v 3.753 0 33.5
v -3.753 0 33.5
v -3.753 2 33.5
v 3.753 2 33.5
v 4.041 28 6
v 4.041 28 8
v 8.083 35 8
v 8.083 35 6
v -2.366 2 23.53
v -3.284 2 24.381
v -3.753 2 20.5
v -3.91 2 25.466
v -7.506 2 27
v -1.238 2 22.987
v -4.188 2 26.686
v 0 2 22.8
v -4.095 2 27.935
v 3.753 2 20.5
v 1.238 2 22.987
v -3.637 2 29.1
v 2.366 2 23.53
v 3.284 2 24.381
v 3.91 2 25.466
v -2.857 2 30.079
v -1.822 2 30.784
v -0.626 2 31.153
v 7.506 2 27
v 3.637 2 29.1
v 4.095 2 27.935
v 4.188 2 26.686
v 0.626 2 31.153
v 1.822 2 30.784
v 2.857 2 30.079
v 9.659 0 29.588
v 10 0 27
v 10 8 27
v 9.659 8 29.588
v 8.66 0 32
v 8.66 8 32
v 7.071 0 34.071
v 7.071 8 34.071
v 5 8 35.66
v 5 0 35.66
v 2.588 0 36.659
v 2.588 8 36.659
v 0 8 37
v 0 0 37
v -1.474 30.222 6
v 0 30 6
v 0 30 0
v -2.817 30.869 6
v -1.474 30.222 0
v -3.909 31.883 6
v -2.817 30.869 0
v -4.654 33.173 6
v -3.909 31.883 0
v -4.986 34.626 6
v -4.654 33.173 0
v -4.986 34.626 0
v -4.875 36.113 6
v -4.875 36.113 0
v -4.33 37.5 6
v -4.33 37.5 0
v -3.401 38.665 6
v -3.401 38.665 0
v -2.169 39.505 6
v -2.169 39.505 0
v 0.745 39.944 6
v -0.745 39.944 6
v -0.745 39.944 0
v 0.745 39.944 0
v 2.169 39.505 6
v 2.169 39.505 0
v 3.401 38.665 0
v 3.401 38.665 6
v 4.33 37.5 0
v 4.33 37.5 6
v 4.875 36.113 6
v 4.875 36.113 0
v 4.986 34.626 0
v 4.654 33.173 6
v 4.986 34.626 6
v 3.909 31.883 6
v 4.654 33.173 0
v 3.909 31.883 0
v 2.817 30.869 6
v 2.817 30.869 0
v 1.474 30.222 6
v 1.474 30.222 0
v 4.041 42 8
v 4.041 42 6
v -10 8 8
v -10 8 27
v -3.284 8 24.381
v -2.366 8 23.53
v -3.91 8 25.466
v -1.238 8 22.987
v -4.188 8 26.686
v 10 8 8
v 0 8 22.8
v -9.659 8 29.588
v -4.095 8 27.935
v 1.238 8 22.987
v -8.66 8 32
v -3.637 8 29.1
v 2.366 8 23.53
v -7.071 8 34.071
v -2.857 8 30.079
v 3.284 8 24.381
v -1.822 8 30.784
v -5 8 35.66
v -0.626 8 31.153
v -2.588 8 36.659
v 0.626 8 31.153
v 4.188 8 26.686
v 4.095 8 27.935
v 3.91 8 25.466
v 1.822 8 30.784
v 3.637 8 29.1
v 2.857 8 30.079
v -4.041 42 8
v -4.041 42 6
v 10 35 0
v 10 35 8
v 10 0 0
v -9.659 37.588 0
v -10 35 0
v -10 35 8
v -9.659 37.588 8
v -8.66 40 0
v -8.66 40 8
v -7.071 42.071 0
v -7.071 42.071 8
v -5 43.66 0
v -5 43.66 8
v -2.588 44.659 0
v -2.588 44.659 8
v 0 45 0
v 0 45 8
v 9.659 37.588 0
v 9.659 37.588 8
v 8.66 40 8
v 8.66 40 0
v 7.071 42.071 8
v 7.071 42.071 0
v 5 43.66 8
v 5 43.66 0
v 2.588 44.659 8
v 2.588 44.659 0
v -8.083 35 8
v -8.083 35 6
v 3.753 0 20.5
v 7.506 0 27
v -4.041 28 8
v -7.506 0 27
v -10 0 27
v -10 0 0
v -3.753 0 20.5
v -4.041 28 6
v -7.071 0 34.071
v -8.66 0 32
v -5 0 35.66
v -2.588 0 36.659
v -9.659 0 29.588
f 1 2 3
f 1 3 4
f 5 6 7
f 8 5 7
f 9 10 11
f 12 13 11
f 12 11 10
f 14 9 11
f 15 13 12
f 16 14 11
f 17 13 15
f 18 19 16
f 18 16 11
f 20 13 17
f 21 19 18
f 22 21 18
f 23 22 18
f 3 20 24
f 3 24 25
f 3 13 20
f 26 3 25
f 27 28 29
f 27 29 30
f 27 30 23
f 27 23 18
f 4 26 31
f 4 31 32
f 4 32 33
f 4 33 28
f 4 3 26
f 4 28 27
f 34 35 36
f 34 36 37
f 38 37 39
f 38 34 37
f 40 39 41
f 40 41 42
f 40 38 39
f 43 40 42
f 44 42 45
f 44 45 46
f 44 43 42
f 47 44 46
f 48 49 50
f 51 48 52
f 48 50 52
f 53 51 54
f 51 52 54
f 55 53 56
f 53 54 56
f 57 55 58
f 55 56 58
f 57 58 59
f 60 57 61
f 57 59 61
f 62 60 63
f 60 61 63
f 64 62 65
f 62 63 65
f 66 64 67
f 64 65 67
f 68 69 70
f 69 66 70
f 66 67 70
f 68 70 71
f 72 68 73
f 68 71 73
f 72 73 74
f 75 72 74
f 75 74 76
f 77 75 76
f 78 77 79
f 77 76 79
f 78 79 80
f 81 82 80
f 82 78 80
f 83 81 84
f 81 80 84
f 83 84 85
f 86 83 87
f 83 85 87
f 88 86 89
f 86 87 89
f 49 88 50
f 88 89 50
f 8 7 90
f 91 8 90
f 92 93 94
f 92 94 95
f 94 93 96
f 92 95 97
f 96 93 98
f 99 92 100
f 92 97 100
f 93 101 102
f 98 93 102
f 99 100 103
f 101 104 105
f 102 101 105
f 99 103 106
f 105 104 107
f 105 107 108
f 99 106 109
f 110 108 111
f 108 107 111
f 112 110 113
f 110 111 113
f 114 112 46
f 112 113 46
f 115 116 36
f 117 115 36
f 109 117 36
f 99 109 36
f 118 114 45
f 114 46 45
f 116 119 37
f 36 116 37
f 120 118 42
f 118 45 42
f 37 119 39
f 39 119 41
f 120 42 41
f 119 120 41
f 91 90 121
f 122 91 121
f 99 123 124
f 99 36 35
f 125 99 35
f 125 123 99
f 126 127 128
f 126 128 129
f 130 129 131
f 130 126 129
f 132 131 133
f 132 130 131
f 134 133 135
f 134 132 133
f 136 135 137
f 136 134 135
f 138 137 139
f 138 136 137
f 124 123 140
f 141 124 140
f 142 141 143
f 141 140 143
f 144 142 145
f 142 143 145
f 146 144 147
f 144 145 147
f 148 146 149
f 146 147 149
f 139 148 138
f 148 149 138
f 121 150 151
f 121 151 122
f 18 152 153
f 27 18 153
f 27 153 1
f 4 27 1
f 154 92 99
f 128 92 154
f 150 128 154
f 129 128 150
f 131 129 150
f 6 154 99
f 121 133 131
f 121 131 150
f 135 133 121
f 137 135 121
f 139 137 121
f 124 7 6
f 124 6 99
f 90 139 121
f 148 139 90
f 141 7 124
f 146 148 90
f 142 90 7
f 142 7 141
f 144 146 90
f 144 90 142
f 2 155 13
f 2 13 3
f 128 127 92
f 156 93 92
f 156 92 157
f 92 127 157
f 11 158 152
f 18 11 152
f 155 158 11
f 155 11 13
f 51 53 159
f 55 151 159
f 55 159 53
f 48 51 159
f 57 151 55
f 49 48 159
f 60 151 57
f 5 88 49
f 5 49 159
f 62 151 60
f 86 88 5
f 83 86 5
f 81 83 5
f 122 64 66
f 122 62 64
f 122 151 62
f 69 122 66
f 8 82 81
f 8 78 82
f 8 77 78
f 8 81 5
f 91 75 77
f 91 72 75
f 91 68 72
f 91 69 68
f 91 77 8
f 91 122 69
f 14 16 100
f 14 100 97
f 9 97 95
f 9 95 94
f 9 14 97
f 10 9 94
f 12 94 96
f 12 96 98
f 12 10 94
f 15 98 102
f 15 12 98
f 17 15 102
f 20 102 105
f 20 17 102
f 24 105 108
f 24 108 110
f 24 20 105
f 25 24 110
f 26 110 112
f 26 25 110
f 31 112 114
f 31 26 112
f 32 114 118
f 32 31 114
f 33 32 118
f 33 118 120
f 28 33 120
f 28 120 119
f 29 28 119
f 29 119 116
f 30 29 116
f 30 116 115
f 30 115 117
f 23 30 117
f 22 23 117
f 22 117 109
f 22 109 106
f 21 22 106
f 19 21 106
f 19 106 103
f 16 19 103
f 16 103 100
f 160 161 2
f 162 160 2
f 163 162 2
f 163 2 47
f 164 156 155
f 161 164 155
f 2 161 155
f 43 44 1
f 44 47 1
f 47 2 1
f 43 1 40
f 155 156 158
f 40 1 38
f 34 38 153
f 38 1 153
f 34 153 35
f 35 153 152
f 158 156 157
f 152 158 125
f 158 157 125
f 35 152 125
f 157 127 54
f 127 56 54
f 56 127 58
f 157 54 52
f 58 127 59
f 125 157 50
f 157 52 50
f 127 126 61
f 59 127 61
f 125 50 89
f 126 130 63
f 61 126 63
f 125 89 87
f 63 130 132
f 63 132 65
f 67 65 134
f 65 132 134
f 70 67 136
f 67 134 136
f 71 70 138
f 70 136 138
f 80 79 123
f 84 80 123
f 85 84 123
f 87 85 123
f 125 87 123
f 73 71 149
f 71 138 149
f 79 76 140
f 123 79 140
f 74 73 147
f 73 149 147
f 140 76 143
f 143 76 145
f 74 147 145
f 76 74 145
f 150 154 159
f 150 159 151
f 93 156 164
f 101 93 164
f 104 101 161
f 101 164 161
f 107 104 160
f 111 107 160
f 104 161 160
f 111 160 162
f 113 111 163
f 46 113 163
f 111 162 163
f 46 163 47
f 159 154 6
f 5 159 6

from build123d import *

# Parameters (mm, degrees)
PAD_DEPTH       = 8
PAD001_DEPTH    = 8
POCKET_DEPTH    = 2
POCKET001_DEPTH = 2


with BuildPart() as part:
    # Sketch → Pad (new body)
    with BuildSketch(Plane.XY):
        with BuildLine():
            ThreePointArc((0, 30), (5, 35), (0, 40))
            Line((0, 40), (0, 45))
            ThreePointArc((10, 35.000023), (7.07106, 42.071076), (0, 45))
            Line((10, 35.000023), (10, 0))
            Line((10, 0), (0, 0))
            Line((0, 0), (0, 30))
        make_face()
    pad = extrude(amount=PAD_DEPTH)

    # Sketch001 → Pad001 (join)
    with BuildSketch(Plane.XZ):
        with BuildLine():
            Line((0, 0), (10, 0))
            Line((10, 0), (10, 27))
            ThreePointArc((10, 27), (7.071068, 34.071068), (0, 37))
            Line((0, 31.2), (0, 37))
            ThreePointArc((0, 22.8), (4.2, 27), (0, 31.2))
            Line((0, 22.8), (0, 0))
        make_face()
    pad001 = extrude(amount=-PAD001_DEPTH)

    # Sketch002 → Pocket (cut)
    with BuildSketch(Plane(origin=(0, 35, 8), x_dir=(1, 0, 0), z_dir=(0, 0, 1))):
        Polygon((8.082904, 0), (4.041452, 7), (-4.041452, 7), (-8.082904, 0), (-4.041452, -7), (4.041452, -7), align=None)
    pocket = extrude(amount=-POCKET_DEPTH, mode=Mode.SUBTRACT)

    # Sketch003 → Pocket001 (cut)
    with BuildSketch(Plane(origin=(0, 0, 27), x_dir=(1, 0, 0), z_dir=(0, -1, 0))):
        Polygon((3.752777, 6.5), (-3.752777, 6.5), (-7.505553, 0), (-3.752777, -6.5), (3.752777, -6.5), (7.505553, 0), align=None)
    pocket001 = extrude(amount=-POCKET001_DEPTH, mode=Mode.SUBTRACT)

    # Mirrored: Pad, Pad001, Pocket, Pocket001 across Sketch V_Axis
    add(pad.mirror(Plane(origin=(0, 0, 0), x_dir=(0, 0, 1), z_dir=(1, 0, 0))))
    add(pad001.mirror(Plane(origin=(0, 0, 0), x_dir=(0, 0, 1), z_dir=(1, 0, 0))))
    add(pocket.mirror(Plane(origin=(0, 0, 0), x_dir=(0, 0, 1), z_dir=(1, 0, 0))), mode=Mode.SUBTRACT)
    add(pocket001.mirror(Plane(origin=(0, 0, 0), x_dir=(0, 0, 1), z_dir=(1, 0, 0))), mode=Mode.SUBTRACT)


solid = part.part
